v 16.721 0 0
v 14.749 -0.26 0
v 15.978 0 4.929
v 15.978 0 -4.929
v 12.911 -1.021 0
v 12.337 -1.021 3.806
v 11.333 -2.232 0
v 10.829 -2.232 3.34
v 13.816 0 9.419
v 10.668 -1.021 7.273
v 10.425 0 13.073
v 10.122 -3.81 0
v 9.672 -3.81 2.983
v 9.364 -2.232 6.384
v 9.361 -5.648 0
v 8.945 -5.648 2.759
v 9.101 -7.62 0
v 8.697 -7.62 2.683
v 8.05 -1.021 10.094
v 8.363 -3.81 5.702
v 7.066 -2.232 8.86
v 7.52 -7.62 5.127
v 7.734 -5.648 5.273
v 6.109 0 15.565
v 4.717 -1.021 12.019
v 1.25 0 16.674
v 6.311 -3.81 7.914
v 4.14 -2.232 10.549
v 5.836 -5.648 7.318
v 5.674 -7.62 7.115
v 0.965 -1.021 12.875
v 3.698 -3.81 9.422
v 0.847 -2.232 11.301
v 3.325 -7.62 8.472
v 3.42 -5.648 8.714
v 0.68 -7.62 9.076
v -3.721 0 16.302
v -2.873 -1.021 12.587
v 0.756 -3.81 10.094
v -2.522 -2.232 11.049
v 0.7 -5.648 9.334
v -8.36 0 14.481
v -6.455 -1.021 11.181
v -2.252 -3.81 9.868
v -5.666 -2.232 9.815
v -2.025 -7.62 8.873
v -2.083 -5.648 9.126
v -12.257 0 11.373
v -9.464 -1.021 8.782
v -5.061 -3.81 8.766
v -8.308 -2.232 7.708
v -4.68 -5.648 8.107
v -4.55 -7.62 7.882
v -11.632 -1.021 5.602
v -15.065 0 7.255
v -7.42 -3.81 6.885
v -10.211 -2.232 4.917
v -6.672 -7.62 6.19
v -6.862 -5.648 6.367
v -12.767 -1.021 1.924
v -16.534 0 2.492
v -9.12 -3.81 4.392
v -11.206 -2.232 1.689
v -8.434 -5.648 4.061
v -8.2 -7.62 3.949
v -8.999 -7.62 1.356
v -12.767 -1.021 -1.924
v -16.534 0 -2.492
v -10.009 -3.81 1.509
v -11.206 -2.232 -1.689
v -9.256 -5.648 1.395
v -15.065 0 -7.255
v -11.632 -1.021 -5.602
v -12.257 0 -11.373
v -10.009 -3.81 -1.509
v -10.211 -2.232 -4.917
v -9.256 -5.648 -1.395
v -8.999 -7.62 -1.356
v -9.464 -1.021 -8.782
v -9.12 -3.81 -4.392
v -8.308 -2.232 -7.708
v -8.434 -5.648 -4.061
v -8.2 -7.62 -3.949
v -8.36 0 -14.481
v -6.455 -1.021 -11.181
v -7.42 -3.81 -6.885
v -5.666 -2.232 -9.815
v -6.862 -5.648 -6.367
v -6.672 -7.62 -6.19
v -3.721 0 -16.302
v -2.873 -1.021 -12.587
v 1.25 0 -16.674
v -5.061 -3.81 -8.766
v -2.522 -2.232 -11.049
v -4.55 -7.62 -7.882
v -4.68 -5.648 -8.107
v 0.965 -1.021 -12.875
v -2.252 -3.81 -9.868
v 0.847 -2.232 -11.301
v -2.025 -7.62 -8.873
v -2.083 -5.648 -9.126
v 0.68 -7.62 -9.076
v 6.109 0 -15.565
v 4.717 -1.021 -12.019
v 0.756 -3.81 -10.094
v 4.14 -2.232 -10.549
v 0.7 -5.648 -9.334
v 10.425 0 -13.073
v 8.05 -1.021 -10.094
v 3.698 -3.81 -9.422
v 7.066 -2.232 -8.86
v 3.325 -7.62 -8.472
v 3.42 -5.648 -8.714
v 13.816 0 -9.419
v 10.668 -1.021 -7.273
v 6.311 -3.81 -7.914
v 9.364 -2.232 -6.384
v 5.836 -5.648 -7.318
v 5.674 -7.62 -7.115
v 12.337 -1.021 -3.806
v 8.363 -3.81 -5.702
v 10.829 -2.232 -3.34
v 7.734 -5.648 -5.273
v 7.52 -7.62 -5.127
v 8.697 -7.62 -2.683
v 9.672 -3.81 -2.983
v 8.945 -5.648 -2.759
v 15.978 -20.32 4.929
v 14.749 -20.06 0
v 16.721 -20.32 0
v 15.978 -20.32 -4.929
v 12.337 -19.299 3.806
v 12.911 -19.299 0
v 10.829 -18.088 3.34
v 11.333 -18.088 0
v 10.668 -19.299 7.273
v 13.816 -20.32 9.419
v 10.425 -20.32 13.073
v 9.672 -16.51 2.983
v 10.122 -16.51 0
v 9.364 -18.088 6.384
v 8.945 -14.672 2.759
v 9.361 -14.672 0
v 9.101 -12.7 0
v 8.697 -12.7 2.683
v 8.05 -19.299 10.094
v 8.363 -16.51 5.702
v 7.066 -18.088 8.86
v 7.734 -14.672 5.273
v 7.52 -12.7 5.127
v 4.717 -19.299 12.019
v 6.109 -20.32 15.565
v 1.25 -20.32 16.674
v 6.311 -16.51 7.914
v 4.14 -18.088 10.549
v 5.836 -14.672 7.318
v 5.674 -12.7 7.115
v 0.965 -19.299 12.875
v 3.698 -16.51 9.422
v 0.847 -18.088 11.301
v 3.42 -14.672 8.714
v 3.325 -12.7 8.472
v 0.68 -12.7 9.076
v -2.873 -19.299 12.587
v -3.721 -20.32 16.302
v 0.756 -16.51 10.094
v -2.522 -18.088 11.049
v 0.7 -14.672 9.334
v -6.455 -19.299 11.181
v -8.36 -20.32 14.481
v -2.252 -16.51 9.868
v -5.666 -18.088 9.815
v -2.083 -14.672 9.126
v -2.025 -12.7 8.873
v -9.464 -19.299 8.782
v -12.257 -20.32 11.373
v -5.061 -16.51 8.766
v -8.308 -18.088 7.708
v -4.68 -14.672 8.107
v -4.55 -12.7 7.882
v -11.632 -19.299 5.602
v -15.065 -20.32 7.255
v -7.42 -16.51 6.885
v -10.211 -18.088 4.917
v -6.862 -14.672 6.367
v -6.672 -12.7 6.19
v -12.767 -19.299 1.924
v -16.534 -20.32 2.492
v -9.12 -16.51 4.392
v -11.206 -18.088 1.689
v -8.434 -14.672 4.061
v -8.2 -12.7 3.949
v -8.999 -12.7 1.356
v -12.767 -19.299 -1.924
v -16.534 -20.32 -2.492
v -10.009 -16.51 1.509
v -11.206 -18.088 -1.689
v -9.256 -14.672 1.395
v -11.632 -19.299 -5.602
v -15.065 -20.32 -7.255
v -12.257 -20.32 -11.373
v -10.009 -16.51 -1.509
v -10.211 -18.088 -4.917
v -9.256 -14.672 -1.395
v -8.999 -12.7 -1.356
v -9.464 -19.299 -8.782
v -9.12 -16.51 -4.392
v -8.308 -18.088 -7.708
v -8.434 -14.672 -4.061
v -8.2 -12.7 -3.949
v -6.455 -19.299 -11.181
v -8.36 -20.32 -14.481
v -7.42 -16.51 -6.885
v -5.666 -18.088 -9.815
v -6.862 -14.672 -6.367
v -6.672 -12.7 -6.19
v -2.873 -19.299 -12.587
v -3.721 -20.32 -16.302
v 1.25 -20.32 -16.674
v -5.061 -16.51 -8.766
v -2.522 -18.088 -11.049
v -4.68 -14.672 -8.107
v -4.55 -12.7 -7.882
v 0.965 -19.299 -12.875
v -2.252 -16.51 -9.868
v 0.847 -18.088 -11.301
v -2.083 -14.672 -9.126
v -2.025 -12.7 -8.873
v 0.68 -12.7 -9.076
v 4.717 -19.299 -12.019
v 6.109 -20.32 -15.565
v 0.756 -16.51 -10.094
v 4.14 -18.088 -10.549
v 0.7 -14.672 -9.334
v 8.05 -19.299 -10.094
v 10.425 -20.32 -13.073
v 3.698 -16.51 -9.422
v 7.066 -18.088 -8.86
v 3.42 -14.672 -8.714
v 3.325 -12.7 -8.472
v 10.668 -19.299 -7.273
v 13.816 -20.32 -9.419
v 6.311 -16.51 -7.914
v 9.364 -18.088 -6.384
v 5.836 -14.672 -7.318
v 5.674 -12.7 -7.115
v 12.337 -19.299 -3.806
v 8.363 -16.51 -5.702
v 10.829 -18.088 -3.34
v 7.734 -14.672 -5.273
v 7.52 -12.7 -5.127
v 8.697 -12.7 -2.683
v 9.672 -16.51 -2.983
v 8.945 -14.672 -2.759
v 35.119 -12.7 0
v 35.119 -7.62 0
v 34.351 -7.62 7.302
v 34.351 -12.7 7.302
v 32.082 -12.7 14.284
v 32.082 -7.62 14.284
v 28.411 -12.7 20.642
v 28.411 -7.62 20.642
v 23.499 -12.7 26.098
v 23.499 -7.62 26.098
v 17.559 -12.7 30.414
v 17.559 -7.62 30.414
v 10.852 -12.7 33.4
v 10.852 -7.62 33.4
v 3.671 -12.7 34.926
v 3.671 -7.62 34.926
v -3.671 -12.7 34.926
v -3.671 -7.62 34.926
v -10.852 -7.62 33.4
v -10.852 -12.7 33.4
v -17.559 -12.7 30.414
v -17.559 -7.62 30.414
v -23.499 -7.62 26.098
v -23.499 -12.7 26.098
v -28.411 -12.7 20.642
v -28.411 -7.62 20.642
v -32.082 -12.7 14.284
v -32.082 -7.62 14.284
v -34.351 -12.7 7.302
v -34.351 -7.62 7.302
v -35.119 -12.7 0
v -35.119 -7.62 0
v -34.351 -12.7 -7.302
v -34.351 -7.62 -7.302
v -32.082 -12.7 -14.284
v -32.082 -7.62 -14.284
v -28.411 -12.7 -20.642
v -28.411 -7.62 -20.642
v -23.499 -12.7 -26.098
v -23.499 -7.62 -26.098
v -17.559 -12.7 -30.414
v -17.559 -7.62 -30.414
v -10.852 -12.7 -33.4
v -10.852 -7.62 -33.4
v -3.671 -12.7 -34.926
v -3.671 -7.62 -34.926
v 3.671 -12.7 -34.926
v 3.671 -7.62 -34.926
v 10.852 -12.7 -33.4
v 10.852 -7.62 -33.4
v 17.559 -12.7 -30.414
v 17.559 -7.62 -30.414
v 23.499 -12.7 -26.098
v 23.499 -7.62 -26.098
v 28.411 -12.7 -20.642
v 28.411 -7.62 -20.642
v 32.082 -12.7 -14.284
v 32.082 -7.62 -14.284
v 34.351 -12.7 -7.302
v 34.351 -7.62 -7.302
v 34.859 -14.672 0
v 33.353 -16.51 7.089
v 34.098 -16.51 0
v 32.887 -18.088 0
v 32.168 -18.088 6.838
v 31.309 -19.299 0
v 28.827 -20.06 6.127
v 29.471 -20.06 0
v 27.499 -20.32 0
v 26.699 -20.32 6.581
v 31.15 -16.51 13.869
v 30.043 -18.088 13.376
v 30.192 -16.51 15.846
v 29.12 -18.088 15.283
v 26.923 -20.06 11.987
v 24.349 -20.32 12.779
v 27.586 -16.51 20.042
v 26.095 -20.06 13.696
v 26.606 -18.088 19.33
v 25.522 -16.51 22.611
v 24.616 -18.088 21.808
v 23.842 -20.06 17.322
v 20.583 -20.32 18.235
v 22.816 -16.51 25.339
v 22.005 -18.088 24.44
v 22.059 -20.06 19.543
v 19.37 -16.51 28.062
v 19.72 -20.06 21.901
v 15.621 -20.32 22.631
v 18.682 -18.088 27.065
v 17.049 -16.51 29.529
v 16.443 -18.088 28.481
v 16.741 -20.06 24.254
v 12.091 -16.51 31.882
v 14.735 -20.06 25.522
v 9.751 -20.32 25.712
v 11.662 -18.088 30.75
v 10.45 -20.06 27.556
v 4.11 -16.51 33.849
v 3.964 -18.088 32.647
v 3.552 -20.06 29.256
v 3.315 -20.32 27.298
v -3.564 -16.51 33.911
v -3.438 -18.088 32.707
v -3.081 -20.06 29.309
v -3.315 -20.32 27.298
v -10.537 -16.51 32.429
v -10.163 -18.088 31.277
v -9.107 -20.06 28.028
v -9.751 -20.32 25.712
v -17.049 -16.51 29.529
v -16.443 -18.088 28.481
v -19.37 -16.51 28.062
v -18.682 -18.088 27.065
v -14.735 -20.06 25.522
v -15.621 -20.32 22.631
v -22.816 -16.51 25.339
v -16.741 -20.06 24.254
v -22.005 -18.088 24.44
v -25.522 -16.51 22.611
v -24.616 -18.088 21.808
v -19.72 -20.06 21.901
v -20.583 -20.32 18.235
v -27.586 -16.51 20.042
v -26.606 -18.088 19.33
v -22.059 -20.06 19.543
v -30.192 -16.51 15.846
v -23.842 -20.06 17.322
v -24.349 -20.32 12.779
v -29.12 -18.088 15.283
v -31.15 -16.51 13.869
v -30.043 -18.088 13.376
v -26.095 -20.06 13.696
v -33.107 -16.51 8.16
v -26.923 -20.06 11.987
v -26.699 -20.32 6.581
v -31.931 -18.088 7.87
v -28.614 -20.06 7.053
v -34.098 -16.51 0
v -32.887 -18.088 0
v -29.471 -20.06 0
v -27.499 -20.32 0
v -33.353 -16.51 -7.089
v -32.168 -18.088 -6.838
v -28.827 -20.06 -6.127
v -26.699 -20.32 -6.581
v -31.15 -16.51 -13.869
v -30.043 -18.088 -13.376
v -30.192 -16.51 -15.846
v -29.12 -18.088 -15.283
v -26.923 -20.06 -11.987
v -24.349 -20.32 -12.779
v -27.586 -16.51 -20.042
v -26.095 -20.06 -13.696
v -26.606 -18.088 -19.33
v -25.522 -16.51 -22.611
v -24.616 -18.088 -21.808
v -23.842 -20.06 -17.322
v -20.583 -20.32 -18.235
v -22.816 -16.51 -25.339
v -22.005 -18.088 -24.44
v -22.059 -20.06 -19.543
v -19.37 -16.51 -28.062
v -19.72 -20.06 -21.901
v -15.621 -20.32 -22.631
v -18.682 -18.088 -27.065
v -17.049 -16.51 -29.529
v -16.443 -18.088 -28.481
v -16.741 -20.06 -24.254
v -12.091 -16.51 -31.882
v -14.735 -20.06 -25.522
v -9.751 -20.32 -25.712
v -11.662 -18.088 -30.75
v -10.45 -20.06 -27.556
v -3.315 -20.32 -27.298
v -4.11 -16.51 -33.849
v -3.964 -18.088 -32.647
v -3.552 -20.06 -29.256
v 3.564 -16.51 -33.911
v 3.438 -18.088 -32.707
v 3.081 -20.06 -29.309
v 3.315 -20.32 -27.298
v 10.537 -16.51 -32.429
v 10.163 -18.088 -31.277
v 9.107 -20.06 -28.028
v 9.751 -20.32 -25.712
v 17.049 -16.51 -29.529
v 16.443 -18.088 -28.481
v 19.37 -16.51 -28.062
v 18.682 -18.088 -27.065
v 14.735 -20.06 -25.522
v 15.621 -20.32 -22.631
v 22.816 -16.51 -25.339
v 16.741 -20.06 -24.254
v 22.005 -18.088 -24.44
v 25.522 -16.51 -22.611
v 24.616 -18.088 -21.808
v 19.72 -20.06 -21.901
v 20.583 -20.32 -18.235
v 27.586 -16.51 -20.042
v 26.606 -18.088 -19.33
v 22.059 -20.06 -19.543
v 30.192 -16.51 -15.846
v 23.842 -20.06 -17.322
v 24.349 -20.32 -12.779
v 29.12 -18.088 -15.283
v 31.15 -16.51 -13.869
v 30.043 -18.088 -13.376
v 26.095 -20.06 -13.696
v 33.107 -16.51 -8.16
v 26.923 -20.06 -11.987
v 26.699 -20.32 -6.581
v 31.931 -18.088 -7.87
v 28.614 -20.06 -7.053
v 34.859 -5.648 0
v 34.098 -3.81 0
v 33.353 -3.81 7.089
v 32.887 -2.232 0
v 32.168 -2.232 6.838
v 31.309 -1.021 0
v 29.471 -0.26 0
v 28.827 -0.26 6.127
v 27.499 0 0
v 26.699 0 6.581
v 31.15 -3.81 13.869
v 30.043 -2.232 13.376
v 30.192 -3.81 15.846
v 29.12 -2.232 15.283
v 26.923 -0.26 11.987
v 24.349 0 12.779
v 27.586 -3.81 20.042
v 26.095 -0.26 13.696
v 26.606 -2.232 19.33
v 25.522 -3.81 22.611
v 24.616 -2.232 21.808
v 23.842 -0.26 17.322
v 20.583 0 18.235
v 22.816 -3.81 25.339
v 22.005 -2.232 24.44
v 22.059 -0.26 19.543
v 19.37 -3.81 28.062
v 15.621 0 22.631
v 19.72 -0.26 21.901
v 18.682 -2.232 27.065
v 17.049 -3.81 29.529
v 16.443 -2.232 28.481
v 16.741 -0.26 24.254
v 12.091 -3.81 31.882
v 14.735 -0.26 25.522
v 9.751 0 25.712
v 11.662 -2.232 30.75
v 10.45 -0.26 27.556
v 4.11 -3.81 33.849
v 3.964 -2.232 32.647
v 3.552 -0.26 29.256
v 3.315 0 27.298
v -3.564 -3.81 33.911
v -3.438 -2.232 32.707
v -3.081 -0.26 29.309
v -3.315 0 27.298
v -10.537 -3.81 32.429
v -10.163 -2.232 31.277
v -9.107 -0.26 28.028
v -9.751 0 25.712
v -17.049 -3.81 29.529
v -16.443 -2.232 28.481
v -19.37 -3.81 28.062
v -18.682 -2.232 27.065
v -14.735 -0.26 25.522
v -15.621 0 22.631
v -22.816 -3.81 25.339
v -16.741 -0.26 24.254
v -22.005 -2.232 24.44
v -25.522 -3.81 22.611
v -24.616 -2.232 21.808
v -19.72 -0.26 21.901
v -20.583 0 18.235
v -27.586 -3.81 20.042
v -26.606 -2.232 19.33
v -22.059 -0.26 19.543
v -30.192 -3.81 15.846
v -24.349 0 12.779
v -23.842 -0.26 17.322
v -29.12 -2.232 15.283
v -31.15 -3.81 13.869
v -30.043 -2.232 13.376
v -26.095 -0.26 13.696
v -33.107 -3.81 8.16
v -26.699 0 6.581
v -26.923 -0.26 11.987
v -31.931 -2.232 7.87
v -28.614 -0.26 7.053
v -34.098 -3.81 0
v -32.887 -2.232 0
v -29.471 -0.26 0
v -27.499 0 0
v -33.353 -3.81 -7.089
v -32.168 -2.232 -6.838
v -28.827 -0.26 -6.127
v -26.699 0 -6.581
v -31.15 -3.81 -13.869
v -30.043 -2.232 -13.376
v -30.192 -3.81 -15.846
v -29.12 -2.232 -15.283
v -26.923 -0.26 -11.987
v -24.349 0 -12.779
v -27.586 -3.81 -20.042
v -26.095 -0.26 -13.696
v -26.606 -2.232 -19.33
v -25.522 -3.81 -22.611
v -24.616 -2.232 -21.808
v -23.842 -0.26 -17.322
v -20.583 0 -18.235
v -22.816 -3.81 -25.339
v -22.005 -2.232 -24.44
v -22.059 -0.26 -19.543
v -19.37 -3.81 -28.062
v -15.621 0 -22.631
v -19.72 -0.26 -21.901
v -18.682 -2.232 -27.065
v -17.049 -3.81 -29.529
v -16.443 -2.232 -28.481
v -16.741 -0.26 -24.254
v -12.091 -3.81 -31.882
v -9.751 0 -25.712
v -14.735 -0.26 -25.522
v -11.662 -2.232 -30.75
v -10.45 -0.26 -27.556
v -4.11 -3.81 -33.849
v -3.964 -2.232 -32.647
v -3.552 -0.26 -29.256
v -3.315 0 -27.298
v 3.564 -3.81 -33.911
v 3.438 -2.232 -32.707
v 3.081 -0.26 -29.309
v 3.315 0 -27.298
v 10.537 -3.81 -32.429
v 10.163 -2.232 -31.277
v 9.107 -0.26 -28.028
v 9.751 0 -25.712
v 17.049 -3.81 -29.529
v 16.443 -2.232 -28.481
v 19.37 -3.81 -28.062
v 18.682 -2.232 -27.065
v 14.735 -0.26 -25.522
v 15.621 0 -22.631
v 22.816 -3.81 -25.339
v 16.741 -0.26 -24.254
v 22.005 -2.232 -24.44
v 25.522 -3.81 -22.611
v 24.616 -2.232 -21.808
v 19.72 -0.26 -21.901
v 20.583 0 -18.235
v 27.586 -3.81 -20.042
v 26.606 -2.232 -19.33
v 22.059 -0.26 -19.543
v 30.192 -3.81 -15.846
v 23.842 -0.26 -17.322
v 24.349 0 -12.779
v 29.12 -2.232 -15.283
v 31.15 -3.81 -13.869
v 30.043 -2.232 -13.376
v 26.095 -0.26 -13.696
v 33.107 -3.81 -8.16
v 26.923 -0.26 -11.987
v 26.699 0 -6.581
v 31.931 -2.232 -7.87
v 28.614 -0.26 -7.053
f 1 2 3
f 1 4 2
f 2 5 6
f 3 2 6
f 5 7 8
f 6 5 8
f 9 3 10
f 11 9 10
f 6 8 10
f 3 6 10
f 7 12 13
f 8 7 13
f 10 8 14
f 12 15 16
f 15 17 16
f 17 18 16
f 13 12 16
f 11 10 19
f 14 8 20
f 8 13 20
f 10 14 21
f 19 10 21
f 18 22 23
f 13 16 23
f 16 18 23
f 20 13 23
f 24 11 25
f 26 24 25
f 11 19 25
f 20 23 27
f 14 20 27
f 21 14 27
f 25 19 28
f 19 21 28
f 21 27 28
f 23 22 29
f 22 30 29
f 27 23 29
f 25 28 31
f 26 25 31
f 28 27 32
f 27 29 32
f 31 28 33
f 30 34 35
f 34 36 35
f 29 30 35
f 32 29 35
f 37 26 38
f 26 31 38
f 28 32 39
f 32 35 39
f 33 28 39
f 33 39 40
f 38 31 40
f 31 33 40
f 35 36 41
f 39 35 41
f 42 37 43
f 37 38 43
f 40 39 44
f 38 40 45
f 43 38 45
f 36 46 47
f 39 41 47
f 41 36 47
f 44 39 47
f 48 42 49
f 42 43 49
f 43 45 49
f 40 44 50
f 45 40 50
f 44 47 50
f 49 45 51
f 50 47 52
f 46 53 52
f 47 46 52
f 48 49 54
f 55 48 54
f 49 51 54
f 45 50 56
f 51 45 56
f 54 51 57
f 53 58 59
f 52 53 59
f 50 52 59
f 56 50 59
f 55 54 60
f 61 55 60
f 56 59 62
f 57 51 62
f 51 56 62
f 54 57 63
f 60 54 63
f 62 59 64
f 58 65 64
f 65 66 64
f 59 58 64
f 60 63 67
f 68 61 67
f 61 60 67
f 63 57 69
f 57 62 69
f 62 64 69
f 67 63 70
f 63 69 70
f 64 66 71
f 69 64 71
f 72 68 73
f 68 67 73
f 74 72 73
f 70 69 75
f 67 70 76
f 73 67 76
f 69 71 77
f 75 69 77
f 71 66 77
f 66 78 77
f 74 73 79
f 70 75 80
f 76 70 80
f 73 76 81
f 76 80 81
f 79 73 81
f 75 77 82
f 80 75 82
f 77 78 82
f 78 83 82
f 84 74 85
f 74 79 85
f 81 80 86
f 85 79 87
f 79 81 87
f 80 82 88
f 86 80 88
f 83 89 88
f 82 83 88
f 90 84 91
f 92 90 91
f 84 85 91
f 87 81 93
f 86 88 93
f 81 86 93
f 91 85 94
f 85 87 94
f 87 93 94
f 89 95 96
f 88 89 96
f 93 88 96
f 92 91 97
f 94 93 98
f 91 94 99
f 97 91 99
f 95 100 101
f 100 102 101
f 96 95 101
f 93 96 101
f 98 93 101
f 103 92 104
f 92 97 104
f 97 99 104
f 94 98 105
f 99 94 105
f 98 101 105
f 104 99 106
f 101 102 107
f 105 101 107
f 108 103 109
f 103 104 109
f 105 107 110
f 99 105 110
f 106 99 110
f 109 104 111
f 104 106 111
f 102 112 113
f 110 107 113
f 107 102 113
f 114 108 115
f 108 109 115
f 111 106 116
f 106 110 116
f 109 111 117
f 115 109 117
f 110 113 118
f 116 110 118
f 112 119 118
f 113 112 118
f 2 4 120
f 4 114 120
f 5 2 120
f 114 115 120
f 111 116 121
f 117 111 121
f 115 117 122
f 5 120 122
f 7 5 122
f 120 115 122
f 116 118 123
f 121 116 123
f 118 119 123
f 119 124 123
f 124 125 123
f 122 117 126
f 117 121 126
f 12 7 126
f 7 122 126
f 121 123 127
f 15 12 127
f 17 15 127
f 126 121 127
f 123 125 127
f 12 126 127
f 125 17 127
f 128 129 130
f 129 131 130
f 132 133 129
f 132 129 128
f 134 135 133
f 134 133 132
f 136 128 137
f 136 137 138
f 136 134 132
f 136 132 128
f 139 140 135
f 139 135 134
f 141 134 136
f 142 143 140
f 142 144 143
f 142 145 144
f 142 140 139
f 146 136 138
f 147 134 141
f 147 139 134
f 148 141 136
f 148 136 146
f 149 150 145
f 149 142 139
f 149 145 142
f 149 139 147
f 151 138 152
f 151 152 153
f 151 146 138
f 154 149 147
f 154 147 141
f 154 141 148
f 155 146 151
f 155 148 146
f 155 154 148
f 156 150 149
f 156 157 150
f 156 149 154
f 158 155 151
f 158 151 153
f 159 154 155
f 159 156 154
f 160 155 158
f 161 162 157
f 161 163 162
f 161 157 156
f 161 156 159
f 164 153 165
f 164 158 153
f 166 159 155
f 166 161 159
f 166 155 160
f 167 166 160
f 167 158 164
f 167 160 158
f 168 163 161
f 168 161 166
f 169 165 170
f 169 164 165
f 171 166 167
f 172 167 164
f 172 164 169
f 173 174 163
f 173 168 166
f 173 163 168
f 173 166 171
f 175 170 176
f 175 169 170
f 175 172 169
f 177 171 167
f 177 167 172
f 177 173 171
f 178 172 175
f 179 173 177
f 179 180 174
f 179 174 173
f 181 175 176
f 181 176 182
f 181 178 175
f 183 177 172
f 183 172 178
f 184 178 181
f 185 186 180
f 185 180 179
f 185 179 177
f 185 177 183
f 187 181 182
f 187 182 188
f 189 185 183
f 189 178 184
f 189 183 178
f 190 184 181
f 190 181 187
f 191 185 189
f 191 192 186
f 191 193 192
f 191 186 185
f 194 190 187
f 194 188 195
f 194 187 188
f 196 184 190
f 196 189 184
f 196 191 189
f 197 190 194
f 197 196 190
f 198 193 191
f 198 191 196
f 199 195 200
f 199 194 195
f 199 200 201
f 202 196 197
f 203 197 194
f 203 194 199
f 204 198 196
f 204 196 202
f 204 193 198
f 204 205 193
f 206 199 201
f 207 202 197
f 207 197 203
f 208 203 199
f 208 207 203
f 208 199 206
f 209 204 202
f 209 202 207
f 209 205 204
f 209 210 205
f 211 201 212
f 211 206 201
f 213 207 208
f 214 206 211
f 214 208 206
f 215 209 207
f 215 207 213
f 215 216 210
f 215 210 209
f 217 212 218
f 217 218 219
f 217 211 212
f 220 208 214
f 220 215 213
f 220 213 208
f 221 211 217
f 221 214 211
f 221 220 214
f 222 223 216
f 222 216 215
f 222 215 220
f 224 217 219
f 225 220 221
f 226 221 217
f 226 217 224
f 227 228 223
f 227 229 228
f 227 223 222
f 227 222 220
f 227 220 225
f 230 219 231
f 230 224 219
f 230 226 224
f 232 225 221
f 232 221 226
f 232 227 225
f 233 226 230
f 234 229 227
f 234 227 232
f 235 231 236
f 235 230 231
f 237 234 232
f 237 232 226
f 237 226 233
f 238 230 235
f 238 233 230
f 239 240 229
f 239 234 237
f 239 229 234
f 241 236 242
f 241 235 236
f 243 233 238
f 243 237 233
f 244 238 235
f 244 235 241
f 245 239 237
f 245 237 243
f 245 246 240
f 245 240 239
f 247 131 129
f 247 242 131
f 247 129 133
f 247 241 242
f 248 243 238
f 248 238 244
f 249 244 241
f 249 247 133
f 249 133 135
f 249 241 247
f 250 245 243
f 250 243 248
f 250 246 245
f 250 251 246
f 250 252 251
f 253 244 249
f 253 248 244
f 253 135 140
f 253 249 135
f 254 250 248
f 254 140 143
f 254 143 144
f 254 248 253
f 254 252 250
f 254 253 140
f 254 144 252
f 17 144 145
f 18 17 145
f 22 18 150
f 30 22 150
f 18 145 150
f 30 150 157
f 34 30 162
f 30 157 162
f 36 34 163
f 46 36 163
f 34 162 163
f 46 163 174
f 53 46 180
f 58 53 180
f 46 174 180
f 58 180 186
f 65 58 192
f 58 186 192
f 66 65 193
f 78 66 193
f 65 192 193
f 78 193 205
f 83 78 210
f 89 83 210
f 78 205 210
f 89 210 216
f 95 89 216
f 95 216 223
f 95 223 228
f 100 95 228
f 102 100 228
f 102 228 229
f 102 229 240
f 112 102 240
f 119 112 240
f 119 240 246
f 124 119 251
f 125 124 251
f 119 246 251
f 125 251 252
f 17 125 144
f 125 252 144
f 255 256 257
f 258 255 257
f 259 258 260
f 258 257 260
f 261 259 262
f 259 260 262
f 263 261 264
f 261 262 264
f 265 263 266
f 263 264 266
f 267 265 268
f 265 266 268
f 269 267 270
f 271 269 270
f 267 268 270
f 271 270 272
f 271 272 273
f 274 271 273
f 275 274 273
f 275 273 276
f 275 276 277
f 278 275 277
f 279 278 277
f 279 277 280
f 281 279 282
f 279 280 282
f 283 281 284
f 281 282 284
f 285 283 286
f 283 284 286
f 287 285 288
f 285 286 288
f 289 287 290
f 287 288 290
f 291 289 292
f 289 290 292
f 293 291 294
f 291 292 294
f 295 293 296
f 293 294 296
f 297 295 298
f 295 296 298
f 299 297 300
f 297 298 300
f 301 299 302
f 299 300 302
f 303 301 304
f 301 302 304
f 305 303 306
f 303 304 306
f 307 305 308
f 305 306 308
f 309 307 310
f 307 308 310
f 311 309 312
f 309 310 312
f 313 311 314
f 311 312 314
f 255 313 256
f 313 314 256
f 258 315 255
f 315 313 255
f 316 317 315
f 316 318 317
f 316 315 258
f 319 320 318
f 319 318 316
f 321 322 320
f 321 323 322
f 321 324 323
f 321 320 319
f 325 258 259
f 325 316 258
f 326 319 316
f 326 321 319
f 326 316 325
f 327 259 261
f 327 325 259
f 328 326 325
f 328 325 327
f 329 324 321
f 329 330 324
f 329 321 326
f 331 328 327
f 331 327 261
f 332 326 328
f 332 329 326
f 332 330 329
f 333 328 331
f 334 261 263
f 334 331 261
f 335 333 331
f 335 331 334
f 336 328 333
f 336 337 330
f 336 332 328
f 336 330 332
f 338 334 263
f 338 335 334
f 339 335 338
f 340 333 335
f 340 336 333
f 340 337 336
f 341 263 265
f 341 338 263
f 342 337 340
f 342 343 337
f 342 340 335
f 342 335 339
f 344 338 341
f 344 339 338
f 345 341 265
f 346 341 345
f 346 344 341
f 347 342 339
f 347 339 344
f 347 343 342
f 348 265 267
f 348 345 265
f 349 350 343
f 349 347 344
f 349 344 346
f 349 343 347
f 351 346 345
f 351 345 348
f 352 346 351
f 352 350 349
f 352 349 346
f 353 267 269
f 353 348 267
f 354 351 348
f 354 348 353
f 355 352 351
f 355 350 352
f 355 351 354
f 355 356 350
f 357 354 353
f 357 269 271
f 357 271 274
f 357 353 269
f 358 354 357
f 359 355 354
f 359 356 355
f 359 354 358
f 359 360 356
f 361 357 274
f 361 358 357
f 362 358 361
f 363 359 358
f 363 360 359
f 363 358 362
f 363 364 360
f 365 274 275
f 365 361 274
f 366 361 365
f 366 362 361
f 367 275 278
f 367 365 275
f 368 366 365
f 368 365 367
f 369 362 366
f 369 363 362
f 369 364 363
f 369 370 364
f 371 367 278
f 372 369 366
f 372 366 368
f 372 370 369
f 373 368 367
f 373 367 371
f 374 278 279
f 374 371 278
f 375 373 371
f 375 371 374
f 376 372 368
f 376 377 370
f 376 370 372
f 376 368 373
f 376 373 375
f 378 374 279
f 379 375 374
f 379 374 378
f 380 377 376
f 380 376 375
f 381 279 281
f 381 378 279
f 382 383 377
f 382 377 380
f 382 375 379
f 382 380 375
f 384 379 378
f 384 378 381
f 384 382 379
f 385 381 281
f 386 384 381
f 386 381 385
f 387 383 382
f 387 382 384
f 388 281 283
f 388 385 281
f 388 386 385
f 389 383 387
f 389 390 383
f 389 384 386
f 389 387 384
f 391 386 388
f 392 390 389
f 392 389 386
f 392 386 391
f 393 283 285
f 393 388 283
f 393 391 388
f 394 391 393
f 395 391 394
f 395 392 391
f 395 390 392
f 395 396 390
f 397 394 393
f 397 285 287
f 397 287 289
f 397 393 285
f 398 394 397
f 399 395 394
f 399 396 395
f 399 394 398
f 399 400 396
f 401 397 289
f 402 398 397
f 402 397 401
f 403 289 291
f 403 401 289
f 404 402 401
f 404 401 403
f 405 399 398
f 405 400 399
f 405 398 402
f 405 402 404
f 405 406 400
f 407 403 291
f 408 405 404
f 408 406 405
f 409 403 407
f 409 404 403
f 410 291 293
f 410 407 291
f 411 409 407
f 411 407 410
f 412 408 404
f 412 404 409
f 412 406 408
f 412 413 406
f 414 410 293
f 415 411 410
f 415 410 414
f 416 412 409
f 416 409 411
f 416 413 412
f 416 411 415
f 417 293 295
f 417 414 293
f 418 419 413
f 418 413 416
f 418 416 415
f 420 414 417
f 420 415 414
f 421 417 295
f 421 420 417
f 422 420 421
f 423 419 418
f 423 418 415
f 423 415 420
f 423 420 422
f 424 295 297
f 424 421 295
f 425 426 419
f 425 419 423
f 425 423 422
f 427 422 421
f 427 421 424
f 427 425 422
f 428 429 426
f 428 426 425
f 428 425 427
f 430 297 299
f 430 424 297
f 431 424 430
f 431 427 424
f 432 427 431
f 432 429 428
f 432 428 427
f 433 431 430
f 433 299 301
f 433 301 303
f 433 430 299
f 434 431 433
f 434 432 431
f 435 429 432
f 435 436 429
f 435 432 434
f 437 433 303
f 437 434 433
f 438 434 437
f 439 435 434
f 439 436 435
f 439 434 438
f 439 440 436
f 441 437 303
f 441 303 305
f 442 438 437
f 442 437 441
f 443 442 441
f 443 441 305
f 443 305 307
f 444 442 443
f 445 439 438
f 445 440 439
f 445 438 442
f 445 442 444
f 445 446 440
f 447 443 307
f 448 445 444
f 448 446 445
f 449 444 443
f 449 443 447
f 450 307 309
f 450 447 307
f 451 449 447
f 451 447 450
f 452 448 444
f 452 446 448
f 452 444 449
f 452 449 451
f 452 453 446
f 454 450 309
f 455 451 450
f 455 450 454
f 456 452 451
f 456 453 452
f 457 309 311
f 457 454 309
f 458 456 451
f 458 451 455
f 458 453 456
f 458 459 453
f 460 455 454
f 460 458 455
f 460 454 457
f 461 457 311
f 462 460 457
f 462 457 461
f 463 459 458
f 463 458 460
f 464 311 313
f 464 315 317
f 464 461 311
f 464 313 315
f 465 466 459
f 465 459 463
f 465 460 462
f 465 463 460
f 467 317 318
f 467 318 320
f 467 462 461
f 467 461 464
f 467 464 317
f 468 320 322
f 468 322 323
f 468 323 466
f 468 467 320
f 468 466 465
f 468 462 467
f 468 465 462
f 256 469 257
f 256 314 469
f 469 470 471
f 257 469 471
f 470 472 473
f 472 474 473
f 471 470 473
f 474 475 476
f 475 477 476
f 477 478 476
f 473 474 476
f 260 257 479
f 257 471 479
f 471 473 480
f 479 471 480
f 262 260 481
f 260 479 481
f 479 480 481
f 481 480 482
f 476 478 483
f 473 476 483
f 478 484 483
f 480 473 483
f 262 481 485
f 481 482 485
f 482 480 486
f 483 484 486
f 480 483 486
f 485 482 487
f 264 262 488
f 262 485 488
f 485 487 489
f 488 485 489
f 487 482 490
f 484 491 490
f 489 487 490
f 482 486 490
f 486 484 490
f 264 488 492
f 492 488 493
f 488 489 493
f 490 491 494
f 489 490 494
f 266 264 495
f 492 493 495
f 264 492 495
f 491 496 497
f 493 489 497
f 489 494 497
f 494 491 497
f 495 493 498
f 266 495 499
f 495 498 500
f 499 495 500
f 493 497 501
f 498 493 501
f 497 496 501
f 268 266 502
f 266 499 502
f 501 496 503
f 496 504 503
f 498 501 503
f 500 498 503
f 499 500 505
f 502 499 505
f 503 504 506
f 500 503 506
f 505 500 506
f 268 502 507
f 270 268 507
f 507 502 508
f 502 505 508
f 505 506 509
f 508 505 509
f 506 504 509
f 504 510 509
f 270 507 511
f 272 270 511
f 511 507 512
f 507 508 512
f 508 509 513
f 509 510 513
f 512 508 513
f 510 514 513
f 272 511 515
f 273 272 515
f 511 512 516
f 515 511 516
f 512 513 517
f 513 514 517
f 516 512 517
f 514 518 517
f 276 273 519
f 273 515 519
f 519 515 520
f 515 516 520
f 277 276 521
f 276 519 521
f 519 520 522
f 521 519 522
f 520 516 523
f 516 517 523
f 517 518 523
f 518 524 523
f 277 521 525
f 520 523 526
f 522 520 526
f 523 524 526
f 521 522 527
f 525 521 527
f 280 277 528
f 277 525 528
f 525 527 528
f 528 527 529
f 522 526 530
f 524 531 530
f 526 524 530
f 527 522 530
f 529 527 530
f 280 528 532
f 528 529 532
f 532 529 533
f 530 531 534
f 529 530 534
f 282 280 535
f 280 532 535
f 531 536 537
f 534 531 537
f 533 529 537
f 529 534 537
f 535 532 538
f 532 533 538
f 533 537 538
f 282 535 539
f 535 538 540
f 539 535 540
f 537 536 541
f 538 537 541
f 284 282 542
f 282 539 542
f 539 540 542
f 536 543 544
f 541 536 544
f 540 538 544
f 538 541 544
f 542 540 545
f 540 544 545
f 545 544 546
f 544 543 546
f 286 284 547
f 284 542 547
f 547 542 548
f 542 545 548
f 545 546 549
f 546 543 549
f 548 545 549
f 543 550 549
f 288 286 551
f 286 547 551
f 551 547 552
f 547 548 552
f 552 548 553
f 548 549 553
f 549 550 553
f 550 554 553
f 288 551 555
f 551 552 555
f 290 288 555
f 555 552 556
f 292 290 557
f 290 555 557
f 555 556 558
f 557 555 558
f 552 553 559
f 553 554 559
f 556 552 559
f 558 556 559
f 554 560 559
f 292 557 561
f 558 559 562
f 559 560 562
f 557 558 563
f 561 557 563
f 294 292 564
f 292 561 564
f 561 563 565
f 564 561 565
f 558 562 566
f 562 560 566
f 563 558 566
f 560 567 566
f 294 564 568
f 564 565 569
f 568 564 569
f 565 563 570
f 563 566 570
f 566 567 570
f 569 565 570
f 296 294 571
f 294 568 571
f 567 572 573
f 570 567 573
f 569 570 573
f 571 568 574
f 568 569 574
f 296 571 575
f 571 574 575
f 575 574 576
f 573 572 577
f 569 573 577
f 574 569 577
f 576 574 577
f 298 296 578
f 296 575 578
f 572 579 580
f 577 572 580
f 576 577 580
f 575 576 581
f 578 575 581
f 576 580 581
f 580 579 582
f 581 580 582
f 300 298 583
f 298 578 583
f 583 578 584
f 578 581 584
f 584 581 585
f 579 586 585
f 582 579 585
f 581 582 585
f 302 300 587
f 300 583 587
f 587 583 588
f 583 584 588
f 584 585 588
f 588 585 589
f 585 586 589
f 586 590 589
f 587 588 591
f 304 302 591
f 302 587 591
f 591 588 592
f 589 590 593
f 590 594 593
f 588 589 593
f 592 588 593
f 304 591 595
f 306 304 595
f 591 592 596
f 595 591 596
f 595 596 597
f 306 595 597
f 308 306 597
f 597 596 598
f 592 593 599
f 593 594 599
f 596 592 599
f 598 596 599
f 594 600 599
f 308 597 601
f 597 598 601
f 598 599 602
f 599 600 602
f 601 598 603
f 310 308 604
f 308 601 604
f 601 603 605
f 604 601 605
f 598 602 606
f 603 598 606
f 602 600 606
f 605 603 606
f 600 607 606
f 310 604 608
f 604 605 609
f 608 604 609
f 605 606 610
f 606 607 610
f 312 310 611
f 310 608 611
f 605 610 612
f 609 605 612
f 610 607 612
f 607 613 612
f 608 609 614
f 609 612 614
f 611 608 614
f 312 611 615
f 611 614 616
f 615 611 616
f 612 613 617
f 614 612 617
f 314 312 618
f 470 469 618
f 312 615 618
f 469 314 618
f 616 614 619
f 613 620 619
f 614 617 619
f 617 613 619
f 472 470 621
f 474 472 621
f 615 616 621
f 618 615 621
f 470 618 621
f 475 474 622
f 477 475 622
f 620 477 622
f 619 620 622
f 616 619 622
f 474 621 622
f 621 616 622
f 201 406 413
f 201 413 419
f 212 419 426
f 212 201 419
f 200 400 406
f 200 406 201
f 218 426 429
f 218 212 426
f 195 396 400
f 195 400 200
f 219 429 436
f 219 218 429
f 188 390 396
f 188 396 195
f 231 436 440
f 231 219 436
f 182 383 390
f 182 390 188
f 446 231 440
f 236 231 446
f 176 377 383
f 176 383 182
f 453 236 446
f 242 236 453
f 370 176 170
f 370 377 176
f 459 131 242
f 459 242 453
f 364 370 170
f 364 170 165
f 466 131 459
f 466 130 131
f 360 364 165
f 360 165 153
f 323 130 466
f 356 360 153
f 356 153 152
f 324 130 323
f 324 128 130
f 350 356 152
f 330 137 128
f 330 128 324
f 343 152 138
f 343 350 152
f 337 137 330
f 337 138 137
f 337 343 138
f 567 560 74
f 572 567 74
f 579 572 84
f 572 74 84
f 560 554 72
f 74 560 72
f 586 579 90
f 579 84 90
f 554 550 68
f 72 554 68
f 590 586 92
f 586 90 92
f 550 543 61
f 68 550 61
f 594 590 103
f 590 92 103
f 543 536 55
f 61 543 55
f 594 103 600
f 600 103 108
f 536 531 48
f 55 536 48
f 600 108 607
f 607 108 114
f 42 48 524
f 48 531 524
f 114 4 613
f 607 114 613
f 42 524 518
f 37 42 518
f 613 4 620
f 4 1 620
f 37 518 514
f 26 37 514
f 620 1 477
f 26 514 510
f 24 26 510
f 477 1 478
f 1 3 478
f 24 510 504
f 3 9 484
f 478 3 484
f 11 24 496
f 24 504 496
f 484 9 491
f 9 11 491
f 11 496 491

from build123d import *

# Parameters (mm, degrees)
F0_R     = 35.118503
F1_DEPTH = 20.32
F2_R     = 9.100995
F3_DEPTH = 20.32
F4_R     = 7.62


with BuildPart() as f1:
    # F0 (on Front) → F1 (new body)
    with BuildSketch(Plane.XZ):
        Circle(F0_R)
    extrude(amount=F1_DEPTH)

    # F2 (on face) → F3 (cut)
    with BuildSketch(Plane.XZ.offset(20.32)):
        Circle(F2_R)
    extrude(amount=-F3_DEPTH, mode=Mode.SUBTRACT)

    # F4
    f4_edges = [f1.edges().sort_by_distance(p)[0] for p in [
        (-35.118503, 0, 0),
        (-35.118503, -20.32, 0),
        (-9.100995, -20.32, 0),
        (-9.100995, 0, 0),
    ]]
    fillet(f4_edges, radius=F4_R)


solid = f1.part
